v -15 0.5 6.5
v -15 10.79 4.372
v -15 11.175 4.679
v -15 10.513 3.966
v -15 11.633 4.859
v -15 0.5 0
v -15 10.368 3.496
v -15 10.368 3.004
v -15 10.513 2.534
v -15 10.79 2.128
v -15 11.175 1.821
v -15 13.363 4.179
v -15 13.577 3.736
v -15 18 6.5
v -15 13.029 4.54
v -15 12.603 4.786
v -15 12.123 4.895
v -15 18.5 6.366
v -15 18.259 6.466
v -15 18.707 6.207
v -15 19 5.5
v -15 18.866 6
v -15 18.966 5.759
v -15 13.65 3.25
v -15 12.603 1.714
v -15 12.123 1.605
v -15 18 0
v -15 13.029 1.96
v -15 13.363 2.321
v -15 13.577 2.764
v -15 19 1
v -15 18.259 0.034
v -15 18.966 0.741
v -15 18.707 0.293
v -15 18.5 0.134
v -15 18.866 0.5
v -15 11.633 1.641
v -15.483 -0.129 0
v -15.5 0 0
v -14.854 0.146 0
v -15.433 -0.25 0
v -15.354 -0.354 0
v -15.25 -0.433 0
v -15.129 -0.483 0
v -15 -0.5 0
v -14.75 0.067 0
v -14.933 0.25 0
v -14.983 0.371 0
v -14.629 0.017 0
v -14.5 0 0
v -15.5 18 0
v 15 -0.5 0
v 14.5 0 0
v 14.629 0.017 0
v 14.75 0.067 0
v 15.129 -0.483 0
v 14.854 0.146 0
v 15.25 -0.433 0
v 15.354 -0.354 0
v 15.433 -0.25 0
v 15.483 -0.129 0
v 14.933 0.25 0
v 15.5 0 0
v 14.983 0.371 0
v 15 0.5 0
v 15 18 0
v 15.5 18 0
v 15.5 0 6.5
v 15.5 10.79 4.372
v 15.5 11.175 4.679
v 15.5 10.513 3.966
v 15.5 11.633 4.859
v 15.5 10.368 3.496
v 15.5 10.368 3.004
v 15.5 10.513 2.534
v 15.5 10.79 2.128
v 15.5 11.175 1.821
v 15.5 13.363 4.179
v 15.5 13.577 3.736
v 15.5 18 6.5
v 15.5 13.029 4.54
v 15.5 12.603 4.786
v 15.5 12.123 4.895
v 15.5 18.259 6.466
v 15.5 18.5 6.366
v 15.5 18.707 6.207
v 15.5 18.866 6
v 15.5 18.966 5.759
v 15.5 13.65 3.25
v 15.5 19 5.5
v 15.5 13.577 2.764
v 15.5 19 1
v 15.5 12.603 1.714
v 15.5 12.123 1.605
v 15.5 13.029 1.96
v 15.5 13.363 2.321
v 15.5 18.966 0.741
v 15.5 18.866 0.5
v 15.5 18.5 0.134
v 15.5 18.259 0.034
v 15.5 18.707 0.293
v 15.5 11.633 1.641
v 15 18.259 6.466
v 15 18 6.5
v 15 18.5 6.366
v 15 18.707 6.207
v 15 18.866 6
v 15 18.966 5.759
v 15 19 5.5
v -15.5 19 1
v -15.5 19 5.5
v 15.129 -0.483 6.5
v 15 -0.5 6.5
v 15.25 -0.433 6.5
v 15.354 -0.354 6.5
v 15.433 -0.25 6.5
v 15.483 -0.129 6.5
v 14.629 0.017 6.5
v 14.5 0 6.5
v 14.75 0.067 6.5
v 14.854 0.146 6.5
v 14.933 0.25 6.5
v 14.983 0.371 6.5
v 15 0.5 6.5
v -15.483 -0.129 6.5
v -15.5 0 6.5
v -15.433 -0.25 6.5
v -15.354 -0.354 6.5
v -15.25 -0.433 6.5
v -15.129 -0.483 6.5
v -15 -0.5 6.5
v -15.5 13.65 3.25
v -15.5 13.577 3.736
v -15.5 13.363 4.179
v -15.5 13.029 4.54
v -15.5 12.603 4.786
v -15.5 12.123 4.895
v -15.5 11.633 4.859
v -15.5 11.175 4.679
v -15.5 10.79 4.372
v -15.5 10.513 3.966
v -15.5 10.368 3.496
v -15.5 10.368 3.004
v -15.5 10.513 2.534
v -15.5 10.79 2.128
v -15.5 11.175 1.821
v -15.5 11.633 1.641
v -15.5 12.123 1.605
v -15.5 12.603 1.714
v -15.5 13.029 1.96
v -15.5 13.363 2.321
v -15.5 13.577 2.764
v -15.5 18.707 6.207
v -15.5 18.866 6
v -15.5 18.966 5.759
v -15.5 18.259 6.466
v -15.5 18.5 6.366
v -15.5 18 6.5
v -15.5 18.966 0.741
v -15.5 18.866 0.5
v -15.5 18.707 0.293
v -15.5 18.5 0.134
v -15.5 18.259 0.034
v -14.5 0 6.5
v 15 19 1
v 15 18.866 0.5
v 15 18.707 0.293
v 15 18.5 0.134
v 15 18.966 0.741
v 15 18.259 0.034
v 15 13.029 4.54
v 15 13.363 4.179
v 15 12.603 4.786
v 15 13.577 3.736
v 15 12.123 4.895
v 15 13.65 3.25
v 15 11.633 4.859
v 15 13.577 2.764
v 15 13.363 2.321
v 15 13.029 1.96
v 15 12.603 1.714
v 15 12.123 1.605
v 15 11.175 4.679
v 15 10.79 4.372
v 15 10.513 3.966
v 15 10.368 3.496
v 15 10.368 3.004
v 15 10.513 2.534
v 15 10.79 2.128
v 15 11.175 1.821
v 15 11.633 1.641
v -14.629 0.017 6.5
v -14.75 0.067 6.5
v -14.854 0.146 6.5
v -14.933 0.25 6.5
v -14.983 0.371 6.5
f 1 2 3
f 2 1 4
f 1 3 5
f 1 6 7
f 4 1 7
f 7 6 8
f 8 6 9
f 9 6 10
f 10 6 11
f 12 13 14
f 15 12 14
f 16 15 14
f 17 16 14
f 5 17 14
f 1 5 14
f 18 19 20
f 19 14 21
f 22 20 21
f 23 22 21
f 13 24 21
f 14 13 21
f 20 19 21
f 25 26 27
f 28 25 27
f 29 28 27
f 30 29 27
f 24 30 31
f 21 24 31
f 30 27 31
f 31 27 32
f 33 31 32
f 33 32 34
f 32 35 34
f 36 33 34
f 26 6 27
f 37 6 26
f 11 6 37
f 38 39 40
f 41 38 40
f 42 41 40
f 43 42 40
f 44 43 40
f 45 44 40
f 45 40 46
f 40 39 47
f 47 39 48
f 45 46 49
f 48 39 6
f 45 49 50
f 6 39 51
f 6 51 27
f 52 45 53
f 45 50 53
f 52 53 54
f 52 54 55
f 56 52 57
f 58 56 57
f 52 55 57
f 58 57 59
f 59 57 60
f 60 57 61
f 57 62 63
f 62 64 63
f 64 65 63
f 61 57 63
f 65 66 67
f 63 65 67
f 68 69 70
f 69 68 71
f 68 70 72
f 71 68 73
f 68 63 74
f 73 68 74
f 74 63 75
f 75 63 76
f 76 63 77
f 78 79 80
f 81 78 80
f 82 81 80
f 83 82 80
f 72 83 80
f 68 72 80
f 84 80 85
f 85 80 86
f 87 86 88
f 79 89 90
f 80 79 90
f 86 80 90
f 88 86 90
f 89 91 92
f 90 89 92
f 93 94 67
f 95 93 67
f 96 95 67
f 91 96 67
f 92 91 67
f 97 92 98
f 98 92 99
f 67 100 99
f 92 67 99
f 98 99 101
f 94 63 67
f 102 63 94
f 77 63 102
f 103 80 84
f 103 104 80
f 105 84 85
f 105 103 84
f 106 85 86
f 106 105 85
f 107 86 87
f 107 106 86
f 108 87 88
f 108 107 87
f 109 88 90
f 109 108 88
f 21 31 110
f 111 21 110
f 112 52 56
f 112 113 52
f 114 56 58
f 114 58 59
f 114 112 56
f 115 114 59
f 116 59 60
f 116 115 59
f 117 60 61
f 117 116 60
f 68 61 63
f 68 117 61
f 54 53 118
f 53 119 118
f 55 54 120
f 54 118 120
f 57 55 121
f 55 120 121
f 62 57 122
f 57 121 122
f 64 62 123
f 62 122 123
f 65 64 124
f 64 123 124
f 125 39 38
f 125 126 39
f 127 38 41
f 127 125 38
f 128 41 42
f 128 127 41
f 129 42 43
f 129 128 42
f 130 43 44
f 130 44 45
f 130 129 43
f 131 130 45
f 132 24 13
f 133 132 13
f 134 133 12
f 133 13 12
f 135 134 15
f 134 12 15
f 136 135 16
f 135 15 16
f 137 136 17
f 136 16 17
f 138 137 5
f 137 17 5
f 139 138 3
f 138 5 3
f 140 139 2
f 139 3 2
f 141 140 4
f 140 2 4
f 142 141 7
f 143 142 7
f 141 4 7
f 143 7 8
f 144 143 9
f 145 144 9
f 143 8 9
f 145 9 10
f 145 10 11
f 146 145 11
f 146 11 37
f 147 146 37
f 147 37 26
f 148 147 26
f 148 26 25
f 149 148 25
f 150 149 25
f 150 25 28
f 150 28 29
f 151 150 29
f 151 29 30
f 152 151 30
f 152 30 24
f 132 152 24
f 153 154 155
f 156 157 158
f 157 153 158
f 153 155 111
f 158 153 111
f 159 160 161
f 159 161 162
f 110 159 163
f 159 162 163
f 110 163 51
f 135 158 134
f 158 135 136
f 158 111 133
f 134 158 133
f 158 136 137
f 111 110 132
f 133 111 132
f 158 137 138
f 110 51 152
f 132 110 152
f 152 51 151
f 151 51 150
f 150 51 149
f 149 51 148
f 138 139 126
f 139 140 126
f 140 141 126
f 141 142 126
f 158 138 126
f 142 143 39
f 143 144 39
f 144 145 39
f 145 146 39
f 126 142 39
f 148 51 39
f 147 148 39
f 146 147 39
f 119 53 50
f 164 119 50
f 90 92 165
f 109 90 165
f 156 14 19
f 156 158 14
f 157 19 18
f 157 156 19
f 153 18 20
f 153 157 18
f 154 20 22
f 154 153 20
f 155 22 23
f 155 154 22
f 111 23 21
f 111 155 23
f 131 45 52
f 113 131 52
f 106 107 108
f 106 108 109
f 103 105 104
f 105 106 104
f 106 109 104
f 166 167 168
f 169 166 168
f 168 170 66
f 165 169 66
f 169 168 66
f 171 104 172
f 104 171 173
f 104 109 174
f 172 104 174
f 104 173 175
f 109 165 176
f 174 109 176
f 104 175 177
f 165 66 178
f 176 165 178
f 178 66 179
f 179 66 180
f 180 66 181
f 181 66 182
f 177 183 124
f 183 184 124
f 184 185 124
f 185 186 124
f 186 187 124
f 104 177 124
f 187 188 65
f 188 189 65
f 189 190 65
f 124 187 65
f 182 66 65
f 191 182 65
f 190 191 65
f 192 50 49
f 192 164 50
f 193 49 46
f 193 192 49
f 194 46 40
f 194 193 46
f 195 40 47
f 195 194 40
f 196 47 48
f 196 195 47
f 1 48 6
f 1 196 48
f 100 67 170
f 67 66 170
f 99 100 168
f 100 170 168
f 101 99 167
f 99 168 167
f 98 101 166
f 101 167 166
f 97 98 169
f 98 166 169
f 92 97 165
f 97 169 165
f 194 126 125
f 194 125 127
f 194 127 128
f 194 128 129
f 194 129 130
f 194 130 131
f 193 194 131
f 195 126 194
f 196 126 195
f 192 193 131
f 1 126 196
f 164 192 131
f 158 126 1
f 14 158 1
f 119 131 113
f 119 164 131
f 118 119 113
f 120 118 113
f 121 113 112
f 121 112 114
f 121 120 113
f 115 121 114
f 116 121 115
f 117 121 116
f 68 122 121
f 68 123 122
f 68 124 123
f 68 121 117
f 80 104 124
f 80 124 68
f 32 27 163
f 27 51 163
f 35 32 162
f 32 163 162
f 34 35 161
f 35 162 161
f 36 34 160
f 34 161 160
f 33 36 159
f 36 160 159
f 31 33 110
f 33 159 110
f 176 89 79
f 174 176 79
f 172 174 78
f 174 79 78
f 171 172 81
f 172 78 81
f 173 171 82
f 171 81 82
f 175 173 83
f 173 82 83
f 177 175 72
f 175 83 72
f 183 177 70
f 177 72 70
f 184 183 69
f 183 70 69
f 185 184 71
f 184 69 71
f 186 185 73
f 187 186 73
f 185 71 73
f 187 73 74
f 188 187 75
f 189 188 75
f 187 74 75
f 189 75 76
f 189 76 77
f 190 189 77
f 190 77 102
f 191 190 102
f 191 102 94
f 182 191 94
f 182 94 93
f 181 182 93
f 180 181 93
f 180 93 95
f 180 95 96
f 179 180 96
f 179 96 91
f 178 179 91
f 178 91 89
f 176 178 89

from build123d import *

# Parameters (mm, degrees)
F1_DEPTH = 6.5
F2_R     = 1.65
F3_DEPTH = 31.001
F4_R     = 0.5
F5_R     = 1


with BuildPart() as f1:
    # F0 (on Top) → F1 (new body)
    with BuildSketch(Plane.XY):
        Polygon((15, 0), (-15, 0), (-15, 19), (-15.5, 19), (-15.5, -0.5), (15.5, -0.5), (15.5, 19), (15, 19), align=None)
    extrude(amount=F1_DEPTH)

    # F2 (on face) → F3 (cut, through all)
    with BuildSketch(Plane.YZ.offset(15.5)):
        with Locations((12, 3.25)):
            Circle(F2_R)
    extrude(amount=-F3_DEPTH, mode=Mode.SUBTRACT)

    # F4
    f4_edges = [f1.edges().sort_by_distance(p)[0] for p in [
        (-15.5, -0.5, 3.25),
        (15.5, -0.5, 3.25),
        (15, 0, 3.25),
        (-15, 0, 3.25),
    ]]
    fillet(f4_edges, radius=F4_R)

    # F5
    f5_edges = [f1.edges().sort_by_distance(p)[0] for p in [
        (-15.25, 19, 6.5),
        (-15.25, 19, 0),
        (15.25, 19, 6.5),
        (15.25, 19, 0),
    ]]
    fillet(f5_edges, radius=F5_R)


solid = f1.part
